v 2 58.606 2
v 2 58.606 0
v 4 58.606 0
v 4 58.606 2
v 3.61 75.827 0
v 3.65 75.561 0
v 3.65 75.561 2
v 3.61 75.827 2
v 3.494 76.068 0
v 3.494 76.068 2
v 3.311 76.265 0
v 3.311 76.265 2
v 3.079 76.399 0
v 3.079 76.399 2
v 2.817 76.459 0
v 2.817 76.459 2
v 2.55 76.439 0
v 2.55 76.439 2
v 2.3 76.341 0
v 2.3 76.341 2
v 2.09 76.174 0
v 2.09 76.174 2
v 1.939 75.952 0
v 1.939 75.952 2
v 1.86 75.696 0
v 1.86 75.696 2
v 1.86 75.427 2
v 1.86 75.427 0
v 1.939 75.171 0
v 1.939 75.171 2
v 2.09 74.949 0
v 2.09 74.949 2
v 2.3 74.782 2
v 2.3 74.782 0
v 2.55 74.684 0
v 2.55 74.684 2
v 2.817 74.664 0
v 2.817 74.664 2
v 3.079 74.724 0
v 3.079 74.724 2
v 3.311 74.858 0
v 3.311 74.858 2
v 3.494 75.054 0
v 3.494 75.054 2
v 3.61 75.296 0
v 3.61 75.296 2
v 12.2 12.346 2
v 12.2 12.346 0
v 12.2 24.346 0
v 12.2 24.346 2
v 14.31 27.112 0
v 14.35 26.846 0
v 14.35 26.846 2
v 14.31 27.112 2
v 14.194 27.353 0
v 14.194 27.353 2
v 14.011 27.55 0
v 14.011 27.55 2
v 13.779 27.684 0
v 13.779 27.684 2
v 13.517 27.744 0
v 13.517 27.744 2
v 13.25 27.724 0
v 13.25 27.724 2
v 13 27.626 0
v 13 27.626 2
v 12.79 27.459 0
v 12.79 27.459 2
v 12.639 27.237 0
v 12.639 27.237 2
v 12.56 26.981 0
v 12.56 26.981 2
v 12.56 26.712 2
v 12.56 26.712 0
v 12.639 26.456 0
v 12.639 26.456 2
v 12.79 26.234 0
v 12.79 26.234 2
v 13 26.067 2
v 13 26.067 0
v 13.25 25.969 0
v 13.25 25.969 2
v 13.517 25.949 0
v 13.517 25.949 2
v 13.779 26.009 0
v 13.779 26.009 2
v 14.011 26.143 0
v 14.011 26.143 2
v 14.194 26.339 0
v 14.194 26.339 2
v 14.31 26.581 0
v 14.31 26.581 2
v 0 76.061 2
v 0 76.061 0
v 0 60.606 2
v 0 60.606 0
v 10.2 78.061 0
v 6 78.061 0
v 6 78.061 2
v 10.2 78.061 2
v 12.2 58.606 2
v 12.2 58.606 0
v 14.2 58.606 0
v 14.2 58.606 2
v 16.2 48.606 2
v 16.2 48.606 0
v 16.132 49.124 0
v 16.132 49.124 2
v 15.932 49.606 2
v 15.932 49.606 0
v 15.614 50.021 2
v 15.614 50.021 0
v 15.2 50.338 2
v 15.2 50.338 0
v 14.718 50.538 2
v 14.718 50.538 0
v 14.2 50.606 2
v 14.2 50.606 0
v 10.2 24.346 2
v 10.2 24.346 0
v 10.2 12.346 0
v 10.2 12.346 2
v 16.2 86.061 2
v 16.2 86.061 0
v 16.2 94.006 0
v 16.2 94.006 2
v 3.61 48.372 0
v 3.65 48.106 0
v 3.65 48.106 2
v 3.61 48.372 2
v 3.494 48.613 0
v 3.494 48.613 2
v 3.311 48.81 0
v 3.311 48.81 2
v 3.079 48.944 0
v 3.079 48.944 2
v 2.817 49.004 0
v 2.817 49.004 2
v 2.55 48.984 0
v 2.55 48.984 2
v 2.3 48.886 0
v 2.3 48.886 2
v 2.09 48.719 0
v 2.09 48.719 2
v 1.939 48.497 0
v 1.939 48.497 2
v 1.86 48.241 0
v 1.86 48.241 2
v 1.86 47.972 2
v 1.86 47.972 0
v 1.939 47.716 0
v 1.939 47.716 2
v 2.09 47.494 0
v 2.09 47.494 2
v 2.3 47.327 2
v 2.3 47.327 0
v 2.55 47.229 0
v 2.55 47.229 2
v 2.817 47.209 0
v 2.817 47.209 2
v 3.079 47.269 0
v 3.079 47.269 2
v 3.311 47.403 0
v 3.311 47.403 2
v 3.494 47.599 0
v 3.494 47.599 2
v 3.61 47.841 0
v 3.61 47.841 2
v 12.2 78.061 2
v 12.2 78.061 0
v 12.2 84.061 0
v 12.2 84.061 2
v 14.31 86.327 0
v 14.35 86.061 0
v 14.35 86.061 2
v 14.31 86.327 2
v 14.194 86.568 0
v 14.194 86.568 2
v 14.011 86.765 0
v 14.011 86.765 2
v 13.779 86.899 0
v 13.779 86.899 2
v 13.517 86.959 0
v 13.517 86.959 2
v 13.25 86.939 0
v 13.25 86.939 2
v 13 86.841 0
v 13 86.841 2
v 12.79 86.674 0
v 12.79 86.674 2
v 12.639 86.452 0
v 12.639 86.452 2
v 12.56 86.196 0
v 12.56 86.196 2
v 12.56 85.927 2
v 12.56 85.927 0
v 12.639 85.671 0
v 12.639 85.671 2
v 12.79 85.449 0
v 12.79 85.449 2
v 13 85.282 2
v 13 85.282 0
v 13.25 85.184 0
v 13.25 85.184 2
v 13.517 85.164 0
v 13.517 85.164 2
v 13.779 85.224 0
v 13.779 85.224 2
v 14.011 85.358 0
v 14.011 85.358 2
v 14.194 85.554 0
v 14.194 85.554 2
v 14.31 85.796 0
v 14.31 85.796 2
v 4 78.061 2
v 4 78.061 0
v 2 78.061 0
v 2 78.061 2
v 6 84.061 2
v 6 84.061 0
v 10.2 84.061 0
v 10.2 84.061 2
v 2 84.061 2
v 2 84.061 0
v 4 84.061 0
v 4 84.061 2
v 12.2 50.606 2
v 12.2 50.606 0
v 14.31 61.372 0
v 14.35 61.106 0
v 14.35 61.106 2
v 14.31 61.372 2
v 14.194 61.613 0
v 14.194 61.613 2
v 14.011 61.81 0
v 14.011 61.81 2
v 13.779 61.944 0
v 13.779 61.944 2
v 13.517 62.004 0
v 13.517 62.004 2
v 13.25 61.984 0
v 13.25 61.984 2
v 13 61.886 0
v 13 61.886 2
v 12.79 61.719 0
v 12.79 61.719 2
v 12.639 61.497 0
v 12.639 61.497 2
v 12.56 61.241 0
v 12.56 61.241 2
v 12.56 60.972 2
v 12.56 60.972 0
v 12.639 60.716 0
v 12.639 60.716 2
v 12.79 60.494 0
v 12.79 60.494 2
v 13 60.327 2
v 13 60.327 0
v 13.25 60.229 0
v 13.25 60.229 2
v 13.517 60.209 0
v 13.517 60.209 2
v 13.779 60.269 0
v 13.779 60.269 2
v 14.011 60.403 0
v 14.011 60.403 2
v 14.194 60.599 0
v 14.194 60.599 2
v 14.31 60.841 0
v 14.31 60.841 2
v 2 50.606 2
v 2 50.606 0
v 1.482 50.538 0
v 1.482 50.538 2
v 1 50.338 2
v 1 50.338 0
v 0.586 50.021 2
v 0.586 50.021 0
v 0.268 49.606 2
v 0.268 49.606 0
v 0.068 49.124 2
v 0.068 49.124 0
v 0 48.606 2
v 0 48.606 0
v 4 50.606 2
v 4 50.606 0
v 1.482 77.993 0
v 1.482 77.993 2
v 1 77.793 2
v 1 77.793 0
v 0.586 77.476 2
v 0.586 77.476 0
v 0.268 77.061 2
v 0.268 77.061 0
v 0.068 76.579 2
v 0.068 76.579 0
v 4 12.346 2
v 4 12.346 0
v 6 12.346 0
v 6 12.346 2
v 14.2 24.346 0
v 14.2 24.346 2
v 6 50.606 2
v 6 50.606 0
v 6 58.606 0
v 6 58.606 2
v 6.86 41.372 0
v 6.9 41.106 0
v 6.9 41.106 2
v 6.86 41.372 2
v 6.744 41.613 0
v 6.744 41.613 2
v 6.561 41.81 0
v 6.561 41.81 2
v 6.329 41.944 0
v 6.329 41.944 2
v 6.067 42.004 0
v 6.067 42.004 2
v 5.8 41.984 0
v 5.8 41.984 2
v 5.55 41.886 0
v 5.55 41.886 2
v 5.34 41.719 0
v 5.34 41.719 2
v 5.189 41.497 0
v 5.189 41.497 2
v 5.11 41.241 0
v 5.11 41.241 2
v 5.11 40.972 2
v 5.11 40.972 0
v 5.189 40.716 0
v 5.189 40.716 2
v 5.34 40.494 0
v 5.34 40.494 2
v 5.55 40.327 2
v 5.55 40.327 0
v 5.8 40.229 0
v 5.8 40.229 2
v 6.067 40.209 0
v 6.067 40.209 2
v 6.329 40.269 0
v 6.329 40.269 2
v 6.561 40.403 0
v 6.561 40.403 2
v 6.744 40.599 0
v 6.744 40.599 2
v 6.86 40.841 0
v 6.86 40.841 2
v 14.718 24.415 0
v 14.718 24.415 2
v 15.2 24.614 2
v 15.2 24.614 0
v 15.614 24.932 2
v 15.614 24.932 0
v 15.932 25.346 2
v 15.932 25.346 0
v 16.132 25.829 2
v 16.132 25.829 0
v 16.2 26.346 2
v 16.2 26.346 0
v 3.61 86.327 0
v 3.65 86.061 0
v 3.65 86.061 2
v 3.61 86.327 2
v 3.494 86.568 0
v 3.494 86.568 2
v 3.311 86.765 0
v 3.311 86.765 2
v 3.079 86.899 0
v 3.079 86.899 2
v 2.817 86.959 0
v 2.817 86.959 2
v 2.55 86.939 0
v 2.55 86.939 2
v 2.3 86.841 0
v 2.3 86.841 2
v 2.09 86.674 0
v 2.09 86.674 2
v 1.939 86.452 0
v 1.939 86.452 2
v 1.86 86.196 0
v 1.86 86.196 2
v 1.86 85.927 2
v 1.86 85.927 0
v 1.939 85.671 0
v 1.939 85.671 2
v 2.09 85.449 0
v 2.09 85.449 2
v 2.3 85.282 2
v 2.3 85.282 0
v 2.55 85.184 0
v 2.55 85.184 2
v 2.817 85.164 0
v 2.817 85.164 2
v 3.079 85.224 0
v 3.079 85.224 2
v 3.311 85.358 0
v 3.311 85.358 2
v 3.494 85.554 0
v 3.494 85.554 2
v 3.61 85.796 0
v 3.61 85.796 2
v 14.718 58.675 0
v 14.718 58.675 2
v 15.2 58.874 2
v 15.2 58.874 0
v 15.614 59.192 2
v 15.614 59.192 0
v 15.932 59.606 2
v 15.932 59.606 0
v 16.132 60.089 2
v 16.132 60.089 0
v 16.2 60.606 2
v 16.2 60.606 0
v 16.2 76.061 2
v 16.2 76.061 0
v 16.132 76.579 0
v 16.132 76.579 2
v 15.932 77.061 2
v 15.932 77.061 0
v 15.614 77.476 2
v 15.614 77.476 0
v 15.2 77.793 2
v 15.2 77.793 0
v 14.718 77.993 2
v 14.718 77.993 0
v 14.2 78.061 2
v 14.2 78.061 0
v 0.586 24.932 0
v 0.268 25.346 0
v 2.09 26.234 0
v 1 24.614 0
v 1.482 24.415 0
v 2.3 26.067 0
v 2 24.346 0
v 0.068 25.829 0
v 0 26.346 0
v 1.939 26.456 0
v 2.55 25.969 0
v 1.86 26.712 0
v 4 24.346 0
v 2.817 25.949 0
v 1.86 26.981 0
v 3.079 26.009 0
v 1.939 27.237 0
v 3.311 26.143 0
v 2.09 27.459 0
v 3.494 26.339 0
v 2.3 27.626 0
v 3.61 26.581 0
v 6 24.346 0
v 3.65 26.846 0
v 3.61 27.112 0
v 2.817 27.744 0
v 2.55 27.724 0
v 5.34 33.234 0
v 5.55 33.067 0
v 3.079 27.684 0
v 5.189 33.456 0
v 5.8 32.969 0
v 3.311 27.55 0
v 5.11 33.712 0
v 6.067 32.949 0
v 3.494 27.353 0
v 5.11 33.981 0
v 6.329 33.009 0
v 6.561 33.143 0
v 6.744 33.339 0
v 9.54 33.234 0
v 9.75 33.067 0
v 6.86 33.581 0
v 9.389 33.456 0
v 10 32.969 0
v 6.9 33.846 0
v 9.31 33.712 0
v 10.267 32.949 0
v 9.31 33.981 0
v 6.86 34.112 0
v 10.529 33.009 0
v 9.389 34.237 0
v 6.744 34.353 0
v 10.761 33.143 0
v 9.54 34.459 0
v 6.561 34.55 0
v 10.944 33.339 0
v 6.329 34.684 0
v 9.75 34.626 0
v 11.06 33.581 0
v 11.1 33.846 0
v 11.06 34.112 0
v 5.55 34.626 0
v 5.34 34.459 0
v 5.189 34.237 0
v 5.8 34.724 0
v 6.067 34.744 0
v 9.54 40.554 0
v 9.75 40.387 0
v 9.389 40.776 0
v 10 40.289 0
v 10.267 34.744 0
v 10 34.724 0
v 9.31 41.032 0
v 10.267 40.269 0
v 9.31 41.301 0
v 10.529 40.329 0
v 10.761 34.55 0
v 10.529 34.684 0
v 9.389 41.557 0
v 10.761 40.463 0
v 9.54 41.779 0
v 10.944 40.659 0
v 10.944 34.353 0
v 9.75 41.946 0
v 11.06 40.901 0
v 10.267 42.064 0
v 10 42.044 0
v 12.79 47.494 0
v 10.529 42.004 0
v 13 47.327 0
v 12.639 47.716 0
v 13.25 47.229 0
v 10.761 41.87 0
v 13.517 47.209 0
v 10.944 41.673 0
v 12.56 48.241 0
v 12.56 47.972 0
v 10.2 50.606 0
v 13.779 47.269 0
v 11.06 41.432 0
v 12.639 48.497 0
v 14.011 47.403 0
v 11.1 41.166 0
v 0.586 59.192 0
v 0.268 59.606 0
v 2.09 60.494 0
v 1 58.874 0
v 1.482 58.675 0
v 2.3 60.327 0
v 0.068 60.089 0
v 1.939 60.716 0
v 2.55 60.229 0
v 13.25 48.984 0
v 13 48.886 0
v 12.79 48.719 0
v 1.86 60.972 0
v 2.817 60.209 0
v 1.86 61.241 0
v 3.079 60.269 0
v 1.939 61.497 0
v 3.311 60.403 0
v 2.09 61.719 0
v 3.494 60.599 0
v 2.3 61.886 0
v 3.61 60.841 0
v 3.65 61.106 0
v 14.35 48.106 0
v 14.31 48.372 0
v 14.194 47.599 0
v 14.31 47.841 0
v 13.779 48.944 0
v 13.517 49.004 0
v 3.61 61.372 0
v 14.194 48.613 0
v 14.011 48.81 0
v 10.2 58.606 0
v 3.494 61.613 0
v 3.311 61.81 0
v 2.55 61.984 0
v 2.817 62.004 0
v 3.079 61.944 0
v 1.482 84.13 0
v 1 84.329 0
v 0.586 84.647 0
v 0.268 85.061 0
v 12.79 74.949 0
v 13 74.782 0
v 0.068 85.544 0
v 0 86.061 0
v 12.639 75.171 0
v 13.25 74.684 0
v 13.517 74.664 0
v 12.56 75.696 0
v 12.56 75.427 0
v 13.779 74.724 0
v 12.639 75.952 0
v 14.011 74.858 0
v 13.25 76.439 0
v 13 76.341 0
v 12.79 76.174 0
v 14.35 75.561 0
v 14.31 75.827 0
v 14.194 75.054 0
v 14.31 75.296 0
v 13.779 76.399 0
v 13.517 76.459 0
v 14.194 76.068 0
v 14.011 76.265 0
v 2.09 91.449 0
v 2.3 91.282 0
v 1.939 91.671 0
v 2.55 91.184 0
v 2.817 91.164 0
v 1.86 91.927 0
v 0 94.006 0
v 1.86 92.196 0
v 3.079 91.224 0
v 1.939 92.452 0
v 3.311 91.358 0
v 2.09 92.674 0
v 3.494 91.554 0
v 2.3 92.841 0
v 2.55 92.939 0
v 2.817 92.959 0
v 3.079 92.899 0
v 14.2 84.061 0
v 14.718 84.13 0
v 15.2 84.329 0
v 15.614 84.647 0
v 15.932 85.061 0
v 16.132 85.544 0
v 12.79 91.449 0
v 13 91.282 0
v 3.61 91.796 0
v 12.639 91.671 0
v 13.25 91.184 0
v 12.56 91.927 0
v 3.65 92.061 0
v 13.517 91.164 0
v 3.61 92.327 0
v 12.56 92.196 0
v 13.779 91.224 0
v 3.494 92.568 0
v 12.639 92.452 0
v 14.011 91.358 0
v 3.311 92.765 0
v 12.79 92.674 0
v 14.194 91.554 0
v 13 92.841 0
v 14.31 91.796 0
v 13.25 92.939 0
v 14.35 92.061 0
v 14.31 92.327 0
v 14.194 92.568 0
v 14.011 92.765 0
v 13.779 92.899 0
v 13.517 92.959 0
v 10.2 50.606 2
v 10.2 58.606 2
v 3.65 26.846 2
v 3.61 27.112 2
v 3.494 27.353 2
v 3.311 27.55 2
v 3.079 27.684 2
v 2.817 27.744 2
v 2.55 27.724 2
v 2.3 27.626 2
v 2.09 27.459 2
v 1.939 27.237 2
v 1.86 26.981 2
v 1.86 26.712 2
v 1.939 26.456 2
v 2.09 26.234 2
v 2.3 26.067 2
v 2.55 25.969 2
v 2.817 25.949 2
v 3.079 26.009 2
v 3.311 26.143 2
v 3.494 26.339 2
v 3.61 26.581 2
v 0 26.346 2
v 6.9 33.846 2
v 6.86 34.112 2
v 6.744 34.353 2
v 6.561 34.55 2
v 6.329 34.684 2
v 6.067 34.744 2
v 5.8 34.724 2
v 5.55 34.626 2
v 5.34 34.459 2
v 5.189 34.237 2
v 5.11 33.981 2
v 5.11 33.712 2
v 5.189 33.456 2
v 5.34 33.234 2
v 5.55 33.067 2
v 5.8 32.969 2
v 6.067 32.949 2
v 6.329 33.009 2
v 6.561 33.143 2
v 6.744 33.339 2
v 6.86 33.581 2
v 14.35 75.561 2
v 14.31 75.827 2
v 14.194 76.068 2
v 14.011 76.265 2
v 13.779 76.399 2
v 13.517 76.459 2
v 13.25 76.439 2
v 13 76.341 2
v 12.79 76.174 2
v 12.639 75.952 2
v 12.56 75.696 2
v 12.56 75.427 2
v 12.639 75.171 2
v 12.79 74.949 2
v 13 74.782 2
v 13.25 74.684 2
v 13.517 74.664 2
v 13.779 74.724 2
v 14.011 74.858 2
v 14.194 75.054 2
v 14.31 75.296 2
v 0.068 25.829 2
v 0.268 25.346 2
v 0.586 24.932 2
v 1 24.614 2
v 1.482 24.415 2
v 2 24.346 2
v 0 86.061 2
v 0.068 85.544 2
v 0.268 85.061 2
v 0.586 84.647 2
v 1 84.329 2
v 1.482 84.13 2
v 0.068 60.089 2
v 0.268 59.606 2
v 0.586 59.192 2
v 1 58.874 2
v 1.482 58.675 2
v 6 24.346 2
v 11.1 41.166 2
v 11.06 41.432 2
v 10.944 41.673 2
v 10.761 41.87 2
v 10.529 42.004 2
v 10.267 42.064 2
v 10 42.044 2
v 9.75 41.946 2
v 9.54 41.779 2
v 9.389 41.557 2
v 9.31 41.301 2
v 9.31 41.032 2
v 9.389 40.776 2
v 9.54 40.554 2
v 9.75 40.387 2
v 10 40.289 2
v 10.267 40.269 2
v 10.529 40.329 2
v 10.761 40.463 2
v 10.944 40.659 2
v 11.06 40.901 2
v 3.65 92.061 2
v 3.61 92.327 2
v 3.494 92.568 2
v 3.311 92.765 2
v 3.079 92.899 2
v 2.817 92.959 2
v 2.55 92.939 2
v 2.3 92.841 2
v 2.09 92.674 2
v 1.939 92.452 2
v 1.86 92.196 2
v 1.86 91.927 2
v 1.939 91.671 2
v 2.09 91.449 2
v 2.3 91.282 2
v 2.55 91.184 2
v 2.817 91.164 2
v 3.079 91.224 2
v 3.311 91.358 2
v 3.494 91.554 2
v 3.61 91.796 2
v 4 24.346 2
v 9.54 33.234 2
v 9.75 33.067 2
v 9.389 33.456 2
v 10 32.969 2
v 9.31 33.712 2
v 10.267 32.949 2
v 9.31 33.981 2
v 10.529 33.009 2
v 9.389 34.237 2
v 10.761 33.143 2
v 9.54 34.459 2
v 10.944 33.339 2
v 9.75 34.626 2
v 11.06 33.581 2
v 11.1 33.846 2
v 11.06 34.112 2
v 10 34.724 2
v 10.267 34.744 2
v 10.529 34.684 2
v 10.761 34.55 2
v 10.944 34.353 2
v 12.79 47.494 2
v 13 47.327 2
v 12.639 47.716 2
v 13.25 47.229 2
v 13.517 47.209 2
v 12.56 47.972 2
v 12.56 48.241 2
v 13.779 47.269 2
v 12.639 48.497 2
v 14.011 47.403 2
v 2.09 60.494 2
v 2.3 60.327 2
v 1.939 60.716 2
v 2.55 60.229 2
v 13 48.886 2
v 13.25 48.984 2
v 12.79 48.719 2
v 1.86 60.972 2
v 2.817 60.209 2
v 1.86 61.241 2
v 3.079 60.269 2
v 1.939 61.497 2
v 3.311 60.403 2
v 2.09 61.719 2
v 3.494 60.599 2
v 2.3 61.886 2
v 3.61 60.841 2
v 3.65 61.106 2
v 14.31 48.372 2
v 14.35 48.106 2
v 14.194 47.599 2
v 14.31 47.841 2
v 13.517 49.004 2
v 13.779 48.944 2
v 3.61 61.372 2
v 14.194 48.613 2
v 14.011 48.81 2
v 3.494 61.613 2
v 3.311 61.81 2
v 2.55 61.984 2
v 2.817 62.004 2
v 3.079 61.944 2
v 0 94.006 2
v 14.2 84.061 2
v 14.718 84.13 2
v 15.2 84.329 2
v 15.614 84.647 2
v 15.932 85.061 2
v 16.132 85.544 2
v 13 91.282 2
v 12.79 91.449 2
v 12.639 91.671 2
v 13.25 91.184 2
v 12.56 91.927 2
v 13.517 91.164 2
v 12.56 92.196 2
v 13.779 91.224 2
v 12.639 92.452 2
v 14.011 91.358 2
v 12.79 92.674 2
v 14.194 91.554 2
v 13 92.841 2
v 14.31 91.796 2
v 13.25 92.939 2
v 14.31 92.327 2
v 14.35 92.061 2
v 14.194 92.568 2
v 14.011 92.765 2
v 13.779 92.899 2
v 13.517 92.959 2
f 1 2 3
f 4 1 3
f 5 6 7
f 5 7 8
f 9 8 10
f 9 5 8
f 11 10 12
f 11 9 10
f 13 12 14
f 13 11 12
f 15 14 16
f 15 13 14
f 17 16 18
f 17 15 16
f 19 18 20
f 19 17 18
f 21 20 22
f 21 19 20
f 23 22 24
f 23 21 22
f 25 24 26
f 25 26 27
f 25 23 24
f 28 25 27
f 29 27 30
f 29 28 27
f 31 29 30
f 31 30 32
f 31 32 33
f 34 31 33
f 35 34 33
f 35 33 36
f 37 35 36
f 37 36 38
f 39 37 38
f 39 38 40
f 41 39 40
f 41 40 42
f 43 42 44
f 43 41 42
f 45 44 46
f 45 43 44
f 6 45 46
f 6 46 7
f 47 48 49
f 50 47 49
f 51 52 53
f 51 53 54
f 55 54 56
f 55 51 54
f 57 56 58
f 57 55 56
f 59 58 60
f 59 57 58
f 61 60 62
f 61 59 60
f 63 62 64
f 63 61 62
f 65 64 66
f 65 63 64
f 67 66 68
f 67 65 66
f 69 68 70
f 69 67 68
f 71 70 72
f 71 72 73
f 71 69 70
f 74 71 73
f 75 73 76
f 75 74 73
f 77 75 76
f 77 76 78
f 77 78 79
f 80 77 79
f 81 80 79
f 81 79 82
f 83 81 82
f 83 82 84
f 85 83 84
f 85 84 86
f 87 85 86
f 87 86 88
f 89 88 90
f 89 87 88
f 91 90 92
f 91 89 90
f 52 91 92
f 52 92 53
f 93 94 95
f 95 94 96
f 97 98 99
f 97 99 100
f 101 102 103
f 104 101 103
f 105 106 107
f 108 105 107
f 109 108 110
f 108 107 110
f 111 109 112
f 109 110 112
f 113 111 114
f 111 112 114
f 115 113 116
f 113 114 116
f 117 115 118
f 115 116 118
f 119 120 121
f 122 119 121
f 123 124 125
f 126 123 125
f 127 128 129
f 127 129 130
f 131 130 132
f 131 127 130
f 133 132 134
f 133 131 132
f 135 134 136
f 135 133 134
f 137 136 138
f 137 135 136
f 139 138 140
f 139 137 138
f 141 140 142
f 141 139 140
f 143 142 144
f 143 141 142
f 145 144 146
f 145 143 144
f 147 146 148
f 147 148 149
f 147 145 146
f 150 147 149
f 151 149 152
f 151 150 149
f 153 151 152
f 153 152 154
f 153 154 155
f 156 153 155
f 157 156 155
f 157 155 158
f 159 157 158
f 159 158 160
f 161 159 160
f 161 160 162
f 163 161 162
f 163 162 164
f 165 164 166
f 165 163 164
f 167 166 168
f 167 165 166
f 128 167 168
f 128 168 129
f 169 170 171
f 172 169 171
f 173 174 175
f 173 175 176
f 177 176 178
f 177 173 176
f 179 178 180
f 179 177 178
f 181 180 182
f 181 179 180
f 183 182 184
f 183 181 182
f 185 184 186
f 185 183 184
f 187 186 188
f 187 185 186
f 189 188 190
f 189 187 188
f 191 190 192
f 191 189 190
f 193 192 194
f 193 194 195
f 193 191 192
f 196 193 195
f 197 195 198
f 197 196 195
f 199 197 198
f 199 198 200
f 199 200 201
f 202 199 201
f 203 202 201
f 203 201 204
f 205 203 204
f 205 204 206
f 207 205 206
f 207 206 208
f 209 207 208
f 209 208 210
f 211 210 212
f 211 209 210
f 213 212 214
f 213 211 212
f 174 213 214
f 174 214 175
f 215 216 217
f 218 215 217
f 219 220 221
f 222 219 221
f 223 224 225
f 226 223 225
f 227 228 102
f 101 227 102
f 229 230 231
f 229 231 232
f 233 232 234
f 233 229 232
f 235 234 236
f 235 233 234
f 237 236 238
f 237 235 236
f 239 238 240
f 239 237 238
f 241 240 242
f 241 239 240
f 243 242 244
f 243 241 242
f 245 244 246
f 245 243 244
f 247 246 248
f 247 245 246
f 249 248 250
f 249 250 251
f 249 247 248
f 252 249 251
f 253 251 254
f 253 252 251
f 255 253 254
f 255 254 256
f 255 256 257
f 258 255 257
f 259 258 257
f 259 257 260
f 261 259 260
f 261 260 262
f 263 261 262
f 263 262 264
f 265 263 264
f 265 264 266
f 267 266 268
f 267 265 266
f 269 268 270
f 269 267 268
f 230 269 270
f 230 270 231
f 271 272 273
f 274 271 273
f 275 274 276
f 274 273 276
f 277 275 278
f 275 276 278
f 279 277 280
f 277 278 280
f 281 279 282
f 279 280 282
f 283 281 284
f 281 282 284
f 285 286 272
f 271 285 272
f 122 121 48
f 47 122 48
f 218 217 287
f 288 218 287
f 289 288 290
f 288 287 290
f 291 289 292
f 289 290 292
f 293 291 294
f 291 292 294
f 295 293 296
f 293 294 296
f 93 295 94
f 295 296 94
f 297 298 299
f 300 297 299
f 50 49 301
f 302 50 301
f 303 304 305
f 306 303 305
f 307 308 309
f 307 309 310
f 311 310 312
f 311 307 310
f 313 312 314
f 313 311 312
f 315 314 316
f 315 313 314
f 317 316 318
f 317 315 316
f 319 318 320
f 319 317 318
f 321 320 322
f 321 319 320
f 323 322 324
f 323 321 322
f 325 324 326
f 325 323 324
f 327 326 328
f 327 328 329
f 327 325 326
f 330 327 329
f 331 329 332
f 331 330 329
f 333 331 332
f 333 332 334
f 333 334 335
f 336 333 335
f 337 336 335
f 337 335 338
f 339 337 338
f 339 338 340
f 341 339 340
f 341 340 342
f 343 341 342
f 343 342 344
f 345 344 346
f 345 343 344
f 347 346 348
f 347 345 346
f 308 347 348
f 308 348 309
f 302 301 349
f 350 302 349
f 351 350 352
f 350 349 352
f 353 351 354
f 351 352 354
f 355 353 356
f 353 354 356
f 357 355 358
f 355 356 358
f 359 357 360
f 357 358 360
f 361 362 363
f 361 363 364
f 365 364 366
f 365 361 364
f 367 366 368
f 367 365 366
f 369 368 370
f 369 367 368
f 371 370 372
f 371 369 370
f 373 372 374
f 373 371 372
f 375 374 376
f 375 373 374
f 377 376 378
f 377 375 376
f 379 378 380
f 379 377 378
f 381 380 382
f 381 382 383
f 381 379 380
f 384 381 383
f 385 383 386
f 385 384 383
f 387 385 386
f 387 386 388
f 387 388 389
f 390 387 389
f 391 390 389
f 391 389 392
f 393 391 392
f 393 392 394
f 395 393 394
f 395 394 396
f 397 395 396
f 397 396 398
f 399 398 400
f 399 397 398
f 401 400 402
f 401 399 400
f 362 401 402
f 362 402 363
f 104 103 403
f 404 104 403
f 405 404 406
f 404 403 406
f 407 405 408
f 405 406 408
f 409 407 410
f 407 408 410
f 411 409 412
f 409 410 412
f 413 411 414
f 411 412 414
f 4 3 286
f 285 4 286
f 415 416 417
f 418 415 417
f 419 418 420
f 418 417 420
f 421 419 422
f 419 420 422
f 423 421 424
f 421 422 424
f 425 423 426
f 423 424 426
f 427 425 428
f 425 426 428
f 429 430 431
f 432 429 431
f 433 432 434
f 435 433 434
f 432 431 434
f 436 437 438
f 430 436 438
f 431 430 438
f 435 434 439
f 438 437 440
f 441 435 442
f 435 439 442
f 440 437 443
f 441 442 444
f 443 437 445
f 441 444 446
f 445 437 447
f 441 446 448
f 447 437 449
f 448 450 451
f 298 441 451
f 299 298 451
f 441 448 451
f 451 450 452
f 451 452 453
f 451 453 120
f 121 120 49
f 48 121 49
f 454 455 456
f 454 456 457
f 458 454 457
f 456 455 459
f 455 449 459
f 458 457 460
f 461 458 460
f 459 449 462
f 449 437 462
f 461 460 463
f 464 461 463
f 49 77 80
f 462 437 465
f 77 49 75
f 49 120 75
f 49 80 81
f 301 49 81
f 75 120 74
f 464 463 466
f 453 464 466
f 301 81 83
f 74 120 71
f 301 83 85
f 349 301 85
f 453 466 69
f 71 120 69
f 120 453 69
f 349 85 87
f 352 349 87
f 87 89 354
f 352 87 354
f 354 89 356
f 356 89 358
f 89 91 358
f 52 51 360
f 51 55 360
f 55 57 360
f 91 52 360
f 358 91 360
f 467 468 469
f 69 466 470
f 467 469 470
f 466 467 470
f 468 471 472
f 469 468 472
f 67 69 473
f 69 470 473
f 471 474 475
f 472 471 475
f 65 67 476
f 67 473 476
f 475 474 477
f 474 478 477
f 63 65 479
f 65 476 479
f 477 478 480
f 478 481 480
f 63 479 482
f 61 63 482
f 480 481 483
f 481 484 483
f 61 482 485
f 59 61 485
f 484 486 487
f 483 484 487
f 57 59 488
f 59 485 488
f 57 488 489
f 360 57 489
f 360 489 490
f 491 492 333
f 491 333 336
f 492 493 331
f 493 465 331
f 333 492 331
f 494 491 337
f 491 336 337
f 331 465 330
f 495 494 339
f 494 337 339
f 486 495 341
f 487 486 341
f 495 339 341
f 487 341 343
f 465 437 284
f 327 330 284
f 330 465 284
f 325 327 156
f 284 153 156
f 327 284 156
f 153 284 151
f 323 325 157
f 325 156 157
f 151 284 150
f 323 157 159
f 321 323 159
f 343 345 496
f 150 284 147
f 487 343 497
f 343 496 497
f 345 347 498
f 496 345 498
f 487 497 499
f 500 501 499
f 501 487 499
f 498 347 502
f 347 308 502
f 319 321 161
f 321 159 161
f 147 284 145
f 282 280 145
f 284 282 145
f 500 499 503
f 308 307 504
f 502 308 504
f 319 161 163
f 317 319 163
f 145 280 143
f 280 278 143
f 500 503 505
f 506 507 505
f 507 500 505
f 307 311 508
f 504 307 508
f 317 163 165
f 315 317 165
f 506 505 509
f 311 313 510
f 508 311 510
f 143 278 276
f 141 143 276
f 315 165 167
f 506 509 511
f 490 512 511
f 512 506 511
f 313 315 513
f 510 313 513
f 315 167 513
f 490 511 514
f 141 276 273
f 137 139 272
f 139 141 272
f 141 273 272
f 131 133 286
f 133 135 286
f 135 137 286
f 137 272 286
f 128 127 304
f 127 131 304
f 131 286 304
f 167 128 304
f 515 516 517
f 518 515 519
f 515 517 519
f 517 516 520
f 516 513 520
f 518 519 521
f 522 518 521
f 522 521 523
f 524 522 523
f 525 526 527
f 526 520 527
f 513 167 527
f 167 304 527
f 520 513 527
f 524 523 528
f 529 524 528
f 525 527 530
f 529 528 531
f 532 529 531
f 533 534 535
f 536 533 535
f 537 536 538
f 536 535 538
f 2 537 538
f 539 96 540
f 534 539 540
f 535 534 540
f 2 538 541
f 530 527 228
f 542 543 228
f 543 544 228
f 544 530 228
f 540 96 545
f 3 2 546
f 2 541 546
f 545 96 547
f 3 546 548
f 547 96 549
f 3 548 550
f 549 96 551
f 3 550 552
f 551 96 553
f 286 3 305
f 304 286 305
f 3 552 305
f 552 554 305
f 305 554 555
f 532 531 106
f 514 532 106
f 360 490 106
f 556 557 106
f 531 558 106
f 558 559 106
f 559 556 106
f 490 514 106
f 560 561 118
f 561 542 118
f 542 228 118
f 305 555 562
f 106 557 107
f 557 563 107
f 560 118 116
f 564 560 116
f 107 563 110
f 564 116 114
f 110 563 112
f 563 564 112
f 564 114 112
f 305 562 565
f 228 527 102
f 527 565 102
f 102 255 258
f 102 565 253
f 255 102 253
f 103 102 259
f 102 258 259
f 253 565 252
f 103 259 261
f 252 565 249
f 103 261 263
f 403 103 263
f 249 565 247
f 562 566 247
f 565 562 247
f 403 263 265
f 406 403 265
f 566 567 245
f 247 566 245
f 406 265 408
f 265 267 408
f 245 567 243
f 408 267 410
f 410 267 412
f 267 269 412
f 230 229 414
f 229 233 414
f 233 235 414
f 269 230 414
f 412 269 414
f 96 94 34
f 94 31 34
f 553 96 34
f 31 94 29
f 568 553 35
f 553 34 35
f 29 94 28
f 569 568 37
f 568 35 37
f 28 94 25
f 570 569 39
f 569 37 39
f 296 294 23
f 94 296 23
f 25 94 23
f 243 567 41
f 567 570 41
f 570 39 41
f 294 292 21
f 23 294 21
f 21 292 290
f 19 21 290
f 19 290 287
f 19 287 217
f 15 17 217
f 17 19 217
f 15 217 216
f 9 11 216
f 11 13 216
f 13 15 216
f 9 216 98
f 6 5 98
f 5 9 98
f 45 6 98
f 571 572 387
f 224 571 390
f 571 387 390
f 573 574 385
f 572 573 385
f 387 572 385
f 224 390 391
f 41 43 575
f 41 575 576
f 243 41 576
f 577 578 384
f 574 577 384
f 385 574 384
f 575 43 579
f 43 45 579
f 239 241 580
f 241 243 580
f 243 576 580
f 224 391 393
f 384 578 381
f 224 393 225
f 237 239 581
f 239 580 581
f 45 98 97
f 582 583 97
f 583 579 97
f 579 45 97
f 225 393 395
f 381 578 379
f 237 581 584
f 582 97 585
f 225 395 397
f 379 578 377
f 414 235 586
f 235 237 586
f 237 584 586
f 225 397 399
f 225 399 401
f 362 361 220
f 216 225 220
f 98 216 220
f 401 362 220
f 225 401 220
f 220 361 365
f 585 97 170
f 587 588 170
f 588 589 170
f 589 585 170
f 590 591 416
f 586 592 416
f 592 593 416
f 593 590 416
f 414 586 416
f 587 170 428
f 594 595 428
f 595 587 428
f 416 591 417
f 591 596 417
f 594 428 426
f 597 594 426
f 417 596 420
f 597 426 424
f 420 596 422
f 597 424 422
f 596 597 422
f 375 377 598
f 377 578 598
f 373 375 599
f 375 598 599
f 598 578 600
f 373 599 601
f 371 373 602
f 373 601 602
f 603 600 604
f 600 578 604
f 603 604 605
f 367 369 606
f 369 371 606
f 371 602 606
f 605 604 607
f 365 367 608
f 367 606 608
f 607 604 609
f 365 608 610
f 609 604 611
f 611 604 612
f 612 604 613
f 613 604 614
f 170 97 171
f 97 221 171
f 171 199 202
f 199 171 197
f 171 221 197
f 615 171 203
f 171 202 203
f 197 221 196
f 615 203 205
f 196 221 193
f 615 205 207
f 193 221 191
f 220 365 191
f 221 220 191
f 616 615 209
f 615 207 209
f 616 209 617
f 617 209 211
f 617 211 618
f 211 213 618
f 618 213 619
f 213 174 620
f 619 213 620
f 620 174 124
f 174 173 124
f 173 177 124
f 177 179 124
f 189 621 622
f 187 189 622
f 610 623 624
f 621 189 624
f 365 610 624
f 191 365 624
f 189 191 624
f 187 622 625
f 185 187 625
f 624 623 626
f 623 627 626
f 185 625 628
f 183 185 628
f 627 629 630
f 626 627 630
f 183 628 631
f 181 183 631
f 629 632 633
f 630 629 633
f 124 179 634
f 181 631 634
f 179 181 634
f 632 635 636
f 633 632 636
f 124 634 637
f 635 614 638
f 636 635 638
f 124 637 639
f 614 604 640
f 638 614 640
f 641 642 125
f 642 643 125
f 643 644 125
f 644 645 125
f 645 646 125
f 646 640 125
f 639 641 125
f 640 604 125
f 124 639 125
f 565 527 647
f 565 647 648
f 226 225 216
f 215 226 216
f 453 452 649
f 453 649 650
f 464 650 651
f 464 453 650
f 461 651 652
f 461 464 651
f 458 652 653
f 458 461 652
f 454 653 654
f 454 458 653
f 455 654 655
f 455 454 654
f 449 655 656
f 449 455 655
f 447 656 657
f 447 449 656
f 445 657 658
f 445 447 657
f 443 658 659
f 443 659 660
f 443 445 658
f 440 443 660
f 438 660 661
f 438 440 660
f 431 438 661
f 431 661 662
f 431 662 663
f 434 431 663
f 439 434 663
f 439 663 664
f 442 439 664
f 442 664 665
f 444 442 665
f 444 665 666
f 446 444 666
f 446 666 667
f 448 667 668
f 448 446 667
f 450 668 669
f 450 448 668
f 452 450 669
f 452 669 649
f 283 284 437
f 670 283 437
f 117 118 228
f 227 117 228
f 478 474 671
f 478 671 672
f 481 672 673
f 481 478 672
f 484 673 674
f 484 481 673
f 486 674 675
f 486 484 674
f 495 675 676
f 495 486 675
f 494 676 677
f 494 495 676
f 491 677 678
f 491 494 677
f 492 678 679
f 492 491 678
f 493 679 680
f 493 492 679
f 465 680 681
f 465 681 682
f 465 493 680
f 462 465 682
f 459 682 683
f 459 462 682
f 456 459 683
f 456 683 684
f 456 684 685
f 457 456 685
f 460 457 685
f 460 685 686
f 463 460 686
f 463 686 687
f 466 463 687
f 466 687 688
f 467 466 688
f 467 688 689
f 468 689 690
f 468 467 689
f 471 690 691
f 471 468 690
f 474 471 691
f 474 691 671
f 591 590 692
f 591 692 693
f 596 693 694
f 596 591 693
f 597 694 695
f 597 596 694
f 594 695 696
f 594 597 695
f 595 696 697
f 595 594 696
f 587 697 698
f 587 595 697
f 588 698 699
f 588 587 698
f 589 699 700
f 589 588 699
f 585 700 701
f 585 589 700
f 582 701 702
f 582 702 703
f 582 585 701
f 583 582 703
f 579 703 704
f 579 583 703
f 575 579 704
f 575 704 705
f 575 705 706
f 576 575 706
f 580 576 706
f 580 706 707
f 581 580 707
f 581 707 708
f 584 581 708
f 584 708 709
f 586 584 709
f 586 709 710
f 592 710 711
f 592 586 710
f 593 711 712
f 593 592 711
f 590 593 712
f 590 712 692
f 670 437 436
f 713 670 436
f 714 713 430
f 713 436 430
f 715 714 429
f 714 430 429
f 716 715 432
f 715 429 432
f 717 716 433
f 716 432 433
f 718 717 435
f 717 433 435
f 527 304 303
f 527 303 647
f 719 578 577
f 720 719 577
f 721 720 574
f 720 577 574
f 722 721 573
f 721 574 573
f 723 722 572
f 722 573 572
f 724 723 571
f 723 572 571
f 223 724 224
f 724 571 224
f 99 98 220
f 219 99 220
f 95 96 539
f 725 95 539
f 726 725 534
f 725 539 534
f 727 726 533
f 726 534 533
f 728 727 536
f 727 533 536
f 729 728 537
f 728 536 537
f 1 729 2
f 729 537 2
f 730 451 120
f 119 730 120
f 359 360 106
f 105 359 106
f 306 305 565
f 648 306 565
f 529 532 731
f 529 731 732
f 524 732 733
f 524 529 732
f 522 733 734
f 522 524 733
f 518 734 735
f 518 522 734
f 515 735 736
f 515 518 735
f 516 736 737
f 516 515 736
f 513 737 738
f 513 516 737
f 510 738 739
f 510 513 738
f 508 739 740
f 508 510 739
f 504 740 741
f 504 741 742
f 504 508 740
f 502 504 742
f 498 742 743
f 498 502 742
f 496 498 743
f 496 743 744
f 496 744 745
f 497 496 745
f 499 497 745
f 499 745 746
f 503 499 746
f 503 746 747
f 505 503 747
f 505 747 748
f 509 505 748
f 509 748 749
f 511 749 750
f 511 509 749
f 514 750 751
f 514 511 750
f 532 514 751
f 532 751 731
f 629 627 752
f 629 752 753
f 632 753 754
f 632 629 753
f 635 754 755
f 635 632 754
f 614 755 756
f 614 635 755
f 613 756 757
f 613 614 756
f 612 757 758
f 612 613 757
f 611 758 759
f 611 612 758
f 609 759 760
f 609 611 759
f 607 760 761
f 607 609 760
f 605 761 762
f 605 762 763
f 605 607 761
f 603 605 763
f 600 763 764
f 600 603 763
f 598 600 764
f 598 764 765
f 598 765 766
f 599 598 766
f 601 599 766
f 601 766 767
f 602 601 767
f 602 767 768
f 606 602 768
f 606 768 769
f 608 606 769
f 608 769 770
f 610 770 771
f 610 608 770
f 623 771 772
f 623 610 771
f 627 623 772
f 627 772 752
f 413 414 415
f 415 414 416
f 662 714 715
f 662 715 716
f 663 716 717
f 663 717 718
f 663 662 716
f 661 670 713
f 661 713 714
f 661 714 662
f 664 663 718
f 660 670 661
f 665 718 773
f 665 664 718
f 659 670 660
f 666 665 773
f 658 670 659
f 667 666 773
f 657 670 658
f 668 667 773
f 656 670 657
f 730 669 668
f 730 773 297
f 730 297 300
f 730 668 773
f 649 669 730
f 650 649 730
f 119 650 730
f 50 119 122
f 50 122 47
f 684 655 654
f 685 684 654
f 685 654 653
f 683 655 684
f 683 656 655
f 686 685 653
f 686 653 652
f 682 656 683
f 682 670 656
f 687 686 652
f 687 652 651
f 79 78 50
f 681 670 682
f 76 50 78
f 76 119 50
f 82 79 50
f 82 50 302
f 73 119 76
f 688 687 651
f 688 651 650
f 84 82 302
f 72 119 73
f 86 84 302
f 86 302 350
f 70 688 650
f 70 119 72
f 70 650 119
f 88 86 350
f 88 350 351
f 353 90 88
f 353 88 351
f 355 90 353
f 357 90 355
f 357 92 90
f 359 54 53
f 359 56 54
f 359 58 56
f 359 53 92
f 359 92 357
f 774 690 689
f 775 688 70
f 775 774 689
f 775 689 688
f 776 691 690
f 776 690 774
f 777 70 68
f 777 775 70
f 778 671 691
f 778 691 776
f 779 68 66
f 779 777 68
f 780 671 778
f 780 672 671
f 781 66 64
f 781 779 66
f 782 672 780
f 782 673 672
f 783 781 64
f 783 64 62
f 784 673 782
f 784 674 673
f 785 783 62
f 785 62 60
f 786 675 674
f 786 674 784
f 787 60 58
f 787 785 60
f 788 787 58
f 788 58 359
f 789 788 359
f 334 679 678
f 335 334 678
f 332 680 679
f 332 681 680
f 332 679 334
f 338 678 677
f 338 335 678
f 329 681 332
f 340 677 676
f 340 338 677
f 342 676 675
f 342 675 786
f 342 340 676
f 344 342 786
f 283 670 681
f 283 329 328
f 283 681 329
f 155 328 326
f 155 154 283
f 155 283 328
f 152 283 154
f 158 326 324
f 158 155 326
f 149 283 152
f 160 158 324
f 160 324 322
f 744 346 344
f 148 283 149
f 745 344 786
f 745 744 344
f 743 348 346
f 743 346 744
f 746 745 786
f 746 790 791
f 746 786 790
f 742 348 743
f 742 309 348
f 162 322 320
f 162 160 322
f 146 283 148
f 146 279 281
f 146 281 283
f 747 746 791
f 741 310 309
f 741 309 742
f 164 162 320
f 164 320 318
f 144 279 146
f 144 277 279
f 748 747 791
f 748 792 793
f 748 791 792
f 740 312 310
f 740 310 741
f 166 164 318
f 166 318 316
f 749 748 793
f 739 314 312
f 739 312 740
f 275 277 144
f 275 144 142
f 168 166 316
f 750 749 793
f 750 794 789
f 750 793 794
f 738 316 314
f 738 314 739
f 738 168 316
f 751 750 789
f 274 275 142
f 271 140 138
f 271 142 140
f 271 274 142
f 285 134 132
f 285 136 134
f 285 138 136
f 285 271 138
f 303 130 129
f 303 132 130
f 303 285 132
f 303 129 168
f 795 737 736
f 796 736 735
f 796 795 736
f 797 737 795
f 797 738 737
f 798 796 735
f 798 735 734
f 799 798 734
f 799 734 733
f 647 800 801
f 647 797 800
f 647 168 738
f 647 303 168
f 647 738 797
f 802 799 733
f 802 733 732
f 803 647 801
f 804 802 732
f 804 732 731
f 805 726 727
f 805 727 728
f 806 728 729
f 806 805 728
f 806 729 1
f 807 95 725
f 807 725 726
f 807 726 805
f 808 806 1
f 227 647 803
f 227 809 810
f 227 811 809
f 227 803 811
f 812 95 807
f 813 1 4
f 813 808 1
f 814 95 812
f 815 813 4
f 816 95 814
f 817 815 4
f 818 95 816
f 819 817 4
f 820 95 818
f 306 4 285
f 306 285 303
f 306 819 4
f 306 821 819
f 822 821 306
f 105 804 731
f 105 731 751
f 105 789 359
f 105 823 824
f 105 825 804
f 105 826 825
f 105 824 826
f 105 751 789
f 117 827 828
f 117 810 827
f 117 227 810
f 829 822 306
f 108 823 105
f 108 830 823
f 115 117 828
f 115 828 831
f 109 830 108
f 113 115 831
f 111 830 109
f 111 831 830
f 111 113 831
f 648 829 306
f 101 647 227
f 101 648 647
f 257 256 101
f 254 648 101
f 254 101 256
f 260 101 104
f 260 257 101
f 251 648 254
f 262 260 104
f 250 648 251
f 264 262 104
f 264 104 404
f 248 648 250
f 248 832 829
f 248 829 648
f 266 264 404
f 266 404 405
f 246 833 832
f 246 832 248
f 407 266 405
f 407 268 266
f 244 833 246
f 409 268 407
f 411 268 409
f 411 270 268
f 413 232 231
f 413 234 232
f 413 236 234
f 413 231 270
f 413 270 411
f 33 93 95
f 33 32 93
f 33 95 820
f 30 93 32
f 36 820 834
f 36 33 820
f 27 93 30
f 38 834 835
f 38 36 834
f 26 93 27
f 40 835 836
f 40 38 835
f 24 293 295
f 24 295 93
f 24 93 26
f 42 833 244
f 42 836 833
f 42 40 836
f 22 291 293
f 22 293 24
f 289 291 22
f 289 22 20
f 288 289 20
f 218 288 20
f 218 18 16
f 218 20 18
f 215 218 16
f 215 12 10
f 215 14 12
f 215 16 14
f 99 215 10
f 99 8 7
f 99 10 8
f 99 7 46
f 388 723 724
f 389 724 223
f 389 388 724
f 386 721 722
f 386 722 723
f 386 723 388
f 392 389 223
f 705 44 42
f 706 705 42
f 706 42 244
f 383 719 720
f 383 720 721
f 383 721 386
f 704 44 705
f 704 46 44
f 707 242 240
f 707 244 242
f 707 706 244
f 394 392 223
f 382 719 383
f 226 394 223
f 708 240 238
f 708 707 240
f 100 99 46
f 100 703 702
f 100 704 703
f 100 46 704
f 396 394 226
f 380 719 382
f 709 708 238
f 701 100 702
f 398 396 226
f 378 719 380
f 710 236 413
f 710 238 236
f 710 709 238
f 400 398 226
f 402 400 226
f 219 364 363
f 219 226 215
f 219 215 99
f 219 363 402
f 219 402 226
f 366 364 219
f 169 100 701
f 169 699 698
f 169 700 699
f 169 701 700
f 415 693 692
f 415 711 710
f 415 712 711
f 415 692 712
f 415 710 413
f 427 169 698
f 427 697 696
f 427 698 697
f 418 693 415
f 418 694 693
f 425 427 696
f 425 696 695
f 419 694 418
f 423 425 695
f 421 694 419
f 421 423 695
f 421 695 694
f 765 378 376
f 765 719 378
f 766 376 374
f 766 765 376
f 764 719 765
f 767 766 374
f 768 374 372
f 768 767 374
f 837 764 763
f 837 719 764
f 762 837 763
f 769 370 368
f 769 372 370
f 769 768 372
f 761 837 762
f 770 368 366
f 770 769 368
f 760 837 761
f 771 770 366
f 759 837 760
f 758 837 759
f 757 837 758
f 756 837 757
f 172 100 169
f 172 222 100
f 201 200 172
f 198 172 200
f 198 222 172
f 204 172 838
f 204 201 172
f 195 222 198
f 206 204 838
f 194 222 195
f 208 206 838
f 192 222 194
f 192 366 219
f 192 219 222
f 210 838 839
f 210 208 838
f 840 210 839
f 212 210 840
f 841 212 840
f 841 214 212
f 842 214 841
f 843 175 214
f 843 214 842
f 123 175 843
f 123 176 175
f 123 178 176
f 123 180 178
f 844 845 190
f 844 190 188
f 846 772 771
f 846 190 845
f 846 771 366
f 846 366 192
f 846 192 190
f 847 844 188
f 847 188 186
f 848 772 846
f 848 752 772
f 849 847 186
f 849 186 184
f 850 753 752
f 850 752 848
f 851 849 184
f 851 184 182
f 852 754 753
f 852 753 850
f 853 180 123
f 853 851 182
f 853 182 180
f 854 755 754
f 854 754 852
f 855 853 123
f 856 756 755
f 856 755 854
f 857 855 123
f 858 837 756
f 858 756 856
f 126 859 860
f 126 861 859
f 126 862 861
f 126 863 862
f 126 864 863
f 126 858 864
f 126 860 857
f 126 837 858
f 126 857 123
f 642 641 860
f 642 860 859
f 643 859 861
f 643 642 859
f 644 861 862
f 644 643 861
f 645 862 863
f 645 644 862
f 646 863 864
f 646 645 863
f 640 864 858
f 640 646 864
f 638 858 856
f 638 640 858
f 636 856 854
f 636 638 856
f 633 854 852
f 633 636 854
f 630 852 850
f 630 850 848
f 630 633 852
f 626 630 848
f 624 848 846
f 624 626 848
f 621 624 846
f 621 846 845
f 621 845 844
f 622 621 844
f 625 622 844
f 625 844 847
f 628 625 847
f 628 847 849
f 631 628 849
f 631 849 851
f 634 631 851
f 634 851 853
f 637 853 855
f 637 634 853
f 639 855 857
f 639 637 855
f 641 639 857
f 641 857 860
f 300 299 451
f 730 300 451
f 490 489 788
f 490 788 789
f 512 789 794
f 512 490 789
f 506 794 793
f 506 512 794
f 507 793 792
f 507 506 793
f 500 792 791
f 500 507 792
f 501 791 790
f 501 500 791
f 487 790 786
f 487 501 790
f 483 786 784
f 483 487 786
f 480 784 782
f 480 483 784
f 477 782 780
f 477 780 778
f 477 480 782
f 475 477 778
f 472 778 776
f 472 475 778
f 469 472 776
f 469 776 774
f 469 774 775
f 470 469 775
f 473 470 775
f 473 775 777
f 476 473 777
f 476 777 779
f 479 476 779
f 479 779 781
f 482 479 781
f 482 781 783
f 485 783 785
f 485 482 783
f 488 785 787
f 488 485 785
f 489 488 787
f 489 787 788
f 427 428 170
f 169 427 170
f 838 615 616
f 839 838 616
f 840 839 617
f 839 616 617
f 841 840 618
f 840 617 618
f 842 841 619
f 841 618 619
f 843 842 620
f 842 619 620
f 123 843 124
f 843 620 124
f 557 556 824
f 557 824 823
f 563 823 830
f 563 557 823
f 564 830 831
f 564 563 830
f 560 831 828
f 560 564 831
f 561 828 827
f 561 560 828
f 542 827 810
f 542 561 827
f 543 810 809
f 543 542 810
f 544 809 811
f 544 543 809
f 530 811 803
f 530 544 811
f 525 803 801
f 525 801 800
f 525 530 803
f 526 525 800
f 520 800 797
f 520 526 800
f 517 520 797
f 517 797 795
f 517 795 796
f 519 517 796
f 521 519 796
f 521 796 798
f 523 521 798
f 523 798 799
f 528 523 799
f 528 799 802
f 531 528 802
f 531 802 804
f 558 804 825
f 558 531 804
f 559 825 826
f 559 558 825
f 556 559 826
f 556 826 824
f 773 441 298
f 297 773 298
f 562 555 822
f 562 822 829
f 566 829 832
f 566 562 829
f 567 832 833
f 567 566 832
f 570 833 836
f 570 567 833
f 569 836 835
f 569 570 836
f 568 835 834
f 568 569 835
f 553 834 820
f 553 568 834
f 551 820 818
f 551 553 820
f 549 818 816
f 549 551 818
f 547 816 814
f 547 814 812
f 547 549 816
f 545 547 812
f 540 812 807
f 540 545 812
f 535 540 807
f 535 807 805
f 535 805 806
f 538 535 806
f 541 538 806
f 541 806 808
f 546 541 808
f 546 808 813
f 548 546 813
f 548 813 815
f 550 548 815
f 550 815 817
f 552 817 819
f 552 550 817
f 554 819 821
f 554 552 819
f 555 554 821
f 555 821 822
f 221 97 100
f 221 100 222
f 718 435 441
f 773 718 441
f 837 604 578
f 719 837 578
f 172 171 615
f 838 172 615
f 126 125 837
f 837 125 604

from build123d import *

# Parameters (mm, degrees)
SKETCH3_R           = 0.9
SKETCH3_W           = 4.2
SKETCH3_H           = 8
SKETCH3_H_2         = 6
BOSS_EXTRUDE3_DEPTH = 2


with BuildPart() as part:
    # Sketch3 → Boss-Extrude3 (new body)
    with BuildSketch(Plane.XY):
        with BuildLine():
            Line((0, 94.006448831), (0, 86.061448831))
            ThreePointArc((0, 86.061448831), (0.585786438, 84.647235269), (2, 84.061448831))
            Line((2, 84.061448831), (4, 84.061448831))
            Line((4, 84.061448831), (4, 78.061448831))
            Line((4, 78.061448831), (2, 78.061448831))
            ThreePointArc((2, 78.061448831), (0.585786438, 77.475662393), (0, 76.061448831))
            Line((0, 76.061448831), (0, 60.606448831))
            ThreePointArc((0, 60.606448831), (0.585786438, 59.192235269), (2, 58.606448831))
            Line((2, 58.606448831), (4, 58.606448831))
            Line((4, 58.606448831), (4, 50.606448831))
            Line((4, 50.606448831), (2, 50.606448831))
            ThreePointArc((2, 50.606448831), (0.585786438, 50.020662393), (0, 48.606448831))
            Line((0, 48.606448831), (0, 26.346448831))
            ThreePointArc((0, 26.346448831), (0.585786438, 24.932235269), (2, 24.346448831))
            Line((2, 24.346448831), (4, 24.346448831))
            Line((4, 24.346448831), (4, 12.346448831))
            Line((4, 12.346448831), (6, 12.346448831))
            Line((6, 12.346448831), (6, 24.346448831))
            Line((6, 24.346448831), (10.2, 24.346448831))
            Line((10.2, 24.346448831), (10.2, 12.346448831))
            Line((10.2, 12.346448831), (12.2, 12.346448831))
            Line((12.2, 12.346448831), (12.2, 24.346448831))
            Line((12.2, 24.346448831), (14.2, 24.346448831))
            ThreePointArc((14.2, 24.346448831), (15.614213562, 24.932235269), (16.2, 26.346448831))
            Line((16.2, 26.346448831), (16.2, 48.606448831))
            ThreePointArc((16.2, 48.606448831), (15.614213562, 50.020662393), (14.2, 50.606448831))
            Line((14.2, 50.606448831), (12.2, 50.606448831))
            Line((12.2, 50.606448831), (12.2, 58.606448831))
            Line((12.2, 58.606448831), (14.2, 58.606448831))
            ThreePointArc((14.2, 58.606448831), (15.614213562, 59.192235269), (16.2, 60.606448831))
            Line((16.2, 60.606448831), (16.2, 76.061448831))
            ThreePointArc((16.2, 76.061448831), (15.614213562, 77.475662393), (14.2, 78.061448831))
            Line((14.2, 78.061448831), (12.2, 78.061448831))
            Line((12.2, 78.061448831), (12.2, 84.061448831))
            Line((12.2, 84.061448831), (14.2, 84.061448831))
            ThreePointArc((14.2, 84.061448831), (15.614213562, 84.647235269), (16.2, 86.061448831))
            Line((16.2, 86.061448831), (16.2, 94.006448831))
            Line((16.2, 94.006448831), (0, 94.006448831))
        make_face()
        with Locations((6, 33.846448831)):
            Circle(SKETCH3_R, mode=Mode.SUBTRACT)
        with Locations((10.2, 33.846448831)):
            Circle(SKETCH3_R, mode=Mode.SUBTRACT)
        with Locations((2.75, 86.061448831)):
            Circle(SKETCH3_R, mode=Mode.SUBTRACT)
        with Locations((10.2, 41.166448831)):
            Circle(SKETCH3_R, mode=Mode.SUBTRACT)
        with Locations((13.45, 48.106448831)):
            Circle(SKETCH3_R, mode=Mode.SUBTRACT)
        with Locations((2.75, 92.061448831)):
            Circle(SKETCH3_R, mode=Mode.SUBTRACT)
        with Locations((13.45, 86.061448831)):
            Circle(SKETCH3_R, mode=Mode.SUBTRACT)
        with Locations((2.75, 61.106448831)):
            Circle(SKETCH3_R, mode=Mode.SUBTRACT)
        with Locations((13.45, 61.106448831)):
            Circle(SKETCH3_R, mode=Mode.SUBTRACT)
        with Locations((2.75, 75.561448831)):
            Circle(SKETCH3_R, mode=Mode.SUBTRACT)
        with Locations((13.45, 26.846448831)):
            Circle(SKETCH3_R, mode=Mode.SUBTRACT)
        with Locations((13.45, 75.561448831)):
            Circle(SKETCH3_R, mode=Mode.SUBTRACT)
        with Locations((13.45, 92.061448831)):
            Circle(SKETCH3_R, mode=Mode.SUBTRACT)
        with Locations((2.75, 26.846448831)):
            Circle(SKETCH3_R, mode=Mode.SUBTRACT)
        with Locations((6, 41.106448831)):
            Circle(SKETCH3_R, mode=Mode.SUBTRACT)
        with Locations((2.75, 48.106448831)):
            Circle(SKETCH3_R, mode=Mode.SUBTRACT)
        with Locations((8.1, 54.606448831)):
            Rectangle(SKETCH3_W, SKETCH3_H, mode=Mode.SUBTRACT)
        with Locations((8.1, 81.061448831)):
            Rectangle(SKETCH3_W, SKETCH3_H_2, mode=Mode.SUBTRACT)
    extrude(amount=BOSS_EXTRUDE3_DEPTH)


solid = part.part
